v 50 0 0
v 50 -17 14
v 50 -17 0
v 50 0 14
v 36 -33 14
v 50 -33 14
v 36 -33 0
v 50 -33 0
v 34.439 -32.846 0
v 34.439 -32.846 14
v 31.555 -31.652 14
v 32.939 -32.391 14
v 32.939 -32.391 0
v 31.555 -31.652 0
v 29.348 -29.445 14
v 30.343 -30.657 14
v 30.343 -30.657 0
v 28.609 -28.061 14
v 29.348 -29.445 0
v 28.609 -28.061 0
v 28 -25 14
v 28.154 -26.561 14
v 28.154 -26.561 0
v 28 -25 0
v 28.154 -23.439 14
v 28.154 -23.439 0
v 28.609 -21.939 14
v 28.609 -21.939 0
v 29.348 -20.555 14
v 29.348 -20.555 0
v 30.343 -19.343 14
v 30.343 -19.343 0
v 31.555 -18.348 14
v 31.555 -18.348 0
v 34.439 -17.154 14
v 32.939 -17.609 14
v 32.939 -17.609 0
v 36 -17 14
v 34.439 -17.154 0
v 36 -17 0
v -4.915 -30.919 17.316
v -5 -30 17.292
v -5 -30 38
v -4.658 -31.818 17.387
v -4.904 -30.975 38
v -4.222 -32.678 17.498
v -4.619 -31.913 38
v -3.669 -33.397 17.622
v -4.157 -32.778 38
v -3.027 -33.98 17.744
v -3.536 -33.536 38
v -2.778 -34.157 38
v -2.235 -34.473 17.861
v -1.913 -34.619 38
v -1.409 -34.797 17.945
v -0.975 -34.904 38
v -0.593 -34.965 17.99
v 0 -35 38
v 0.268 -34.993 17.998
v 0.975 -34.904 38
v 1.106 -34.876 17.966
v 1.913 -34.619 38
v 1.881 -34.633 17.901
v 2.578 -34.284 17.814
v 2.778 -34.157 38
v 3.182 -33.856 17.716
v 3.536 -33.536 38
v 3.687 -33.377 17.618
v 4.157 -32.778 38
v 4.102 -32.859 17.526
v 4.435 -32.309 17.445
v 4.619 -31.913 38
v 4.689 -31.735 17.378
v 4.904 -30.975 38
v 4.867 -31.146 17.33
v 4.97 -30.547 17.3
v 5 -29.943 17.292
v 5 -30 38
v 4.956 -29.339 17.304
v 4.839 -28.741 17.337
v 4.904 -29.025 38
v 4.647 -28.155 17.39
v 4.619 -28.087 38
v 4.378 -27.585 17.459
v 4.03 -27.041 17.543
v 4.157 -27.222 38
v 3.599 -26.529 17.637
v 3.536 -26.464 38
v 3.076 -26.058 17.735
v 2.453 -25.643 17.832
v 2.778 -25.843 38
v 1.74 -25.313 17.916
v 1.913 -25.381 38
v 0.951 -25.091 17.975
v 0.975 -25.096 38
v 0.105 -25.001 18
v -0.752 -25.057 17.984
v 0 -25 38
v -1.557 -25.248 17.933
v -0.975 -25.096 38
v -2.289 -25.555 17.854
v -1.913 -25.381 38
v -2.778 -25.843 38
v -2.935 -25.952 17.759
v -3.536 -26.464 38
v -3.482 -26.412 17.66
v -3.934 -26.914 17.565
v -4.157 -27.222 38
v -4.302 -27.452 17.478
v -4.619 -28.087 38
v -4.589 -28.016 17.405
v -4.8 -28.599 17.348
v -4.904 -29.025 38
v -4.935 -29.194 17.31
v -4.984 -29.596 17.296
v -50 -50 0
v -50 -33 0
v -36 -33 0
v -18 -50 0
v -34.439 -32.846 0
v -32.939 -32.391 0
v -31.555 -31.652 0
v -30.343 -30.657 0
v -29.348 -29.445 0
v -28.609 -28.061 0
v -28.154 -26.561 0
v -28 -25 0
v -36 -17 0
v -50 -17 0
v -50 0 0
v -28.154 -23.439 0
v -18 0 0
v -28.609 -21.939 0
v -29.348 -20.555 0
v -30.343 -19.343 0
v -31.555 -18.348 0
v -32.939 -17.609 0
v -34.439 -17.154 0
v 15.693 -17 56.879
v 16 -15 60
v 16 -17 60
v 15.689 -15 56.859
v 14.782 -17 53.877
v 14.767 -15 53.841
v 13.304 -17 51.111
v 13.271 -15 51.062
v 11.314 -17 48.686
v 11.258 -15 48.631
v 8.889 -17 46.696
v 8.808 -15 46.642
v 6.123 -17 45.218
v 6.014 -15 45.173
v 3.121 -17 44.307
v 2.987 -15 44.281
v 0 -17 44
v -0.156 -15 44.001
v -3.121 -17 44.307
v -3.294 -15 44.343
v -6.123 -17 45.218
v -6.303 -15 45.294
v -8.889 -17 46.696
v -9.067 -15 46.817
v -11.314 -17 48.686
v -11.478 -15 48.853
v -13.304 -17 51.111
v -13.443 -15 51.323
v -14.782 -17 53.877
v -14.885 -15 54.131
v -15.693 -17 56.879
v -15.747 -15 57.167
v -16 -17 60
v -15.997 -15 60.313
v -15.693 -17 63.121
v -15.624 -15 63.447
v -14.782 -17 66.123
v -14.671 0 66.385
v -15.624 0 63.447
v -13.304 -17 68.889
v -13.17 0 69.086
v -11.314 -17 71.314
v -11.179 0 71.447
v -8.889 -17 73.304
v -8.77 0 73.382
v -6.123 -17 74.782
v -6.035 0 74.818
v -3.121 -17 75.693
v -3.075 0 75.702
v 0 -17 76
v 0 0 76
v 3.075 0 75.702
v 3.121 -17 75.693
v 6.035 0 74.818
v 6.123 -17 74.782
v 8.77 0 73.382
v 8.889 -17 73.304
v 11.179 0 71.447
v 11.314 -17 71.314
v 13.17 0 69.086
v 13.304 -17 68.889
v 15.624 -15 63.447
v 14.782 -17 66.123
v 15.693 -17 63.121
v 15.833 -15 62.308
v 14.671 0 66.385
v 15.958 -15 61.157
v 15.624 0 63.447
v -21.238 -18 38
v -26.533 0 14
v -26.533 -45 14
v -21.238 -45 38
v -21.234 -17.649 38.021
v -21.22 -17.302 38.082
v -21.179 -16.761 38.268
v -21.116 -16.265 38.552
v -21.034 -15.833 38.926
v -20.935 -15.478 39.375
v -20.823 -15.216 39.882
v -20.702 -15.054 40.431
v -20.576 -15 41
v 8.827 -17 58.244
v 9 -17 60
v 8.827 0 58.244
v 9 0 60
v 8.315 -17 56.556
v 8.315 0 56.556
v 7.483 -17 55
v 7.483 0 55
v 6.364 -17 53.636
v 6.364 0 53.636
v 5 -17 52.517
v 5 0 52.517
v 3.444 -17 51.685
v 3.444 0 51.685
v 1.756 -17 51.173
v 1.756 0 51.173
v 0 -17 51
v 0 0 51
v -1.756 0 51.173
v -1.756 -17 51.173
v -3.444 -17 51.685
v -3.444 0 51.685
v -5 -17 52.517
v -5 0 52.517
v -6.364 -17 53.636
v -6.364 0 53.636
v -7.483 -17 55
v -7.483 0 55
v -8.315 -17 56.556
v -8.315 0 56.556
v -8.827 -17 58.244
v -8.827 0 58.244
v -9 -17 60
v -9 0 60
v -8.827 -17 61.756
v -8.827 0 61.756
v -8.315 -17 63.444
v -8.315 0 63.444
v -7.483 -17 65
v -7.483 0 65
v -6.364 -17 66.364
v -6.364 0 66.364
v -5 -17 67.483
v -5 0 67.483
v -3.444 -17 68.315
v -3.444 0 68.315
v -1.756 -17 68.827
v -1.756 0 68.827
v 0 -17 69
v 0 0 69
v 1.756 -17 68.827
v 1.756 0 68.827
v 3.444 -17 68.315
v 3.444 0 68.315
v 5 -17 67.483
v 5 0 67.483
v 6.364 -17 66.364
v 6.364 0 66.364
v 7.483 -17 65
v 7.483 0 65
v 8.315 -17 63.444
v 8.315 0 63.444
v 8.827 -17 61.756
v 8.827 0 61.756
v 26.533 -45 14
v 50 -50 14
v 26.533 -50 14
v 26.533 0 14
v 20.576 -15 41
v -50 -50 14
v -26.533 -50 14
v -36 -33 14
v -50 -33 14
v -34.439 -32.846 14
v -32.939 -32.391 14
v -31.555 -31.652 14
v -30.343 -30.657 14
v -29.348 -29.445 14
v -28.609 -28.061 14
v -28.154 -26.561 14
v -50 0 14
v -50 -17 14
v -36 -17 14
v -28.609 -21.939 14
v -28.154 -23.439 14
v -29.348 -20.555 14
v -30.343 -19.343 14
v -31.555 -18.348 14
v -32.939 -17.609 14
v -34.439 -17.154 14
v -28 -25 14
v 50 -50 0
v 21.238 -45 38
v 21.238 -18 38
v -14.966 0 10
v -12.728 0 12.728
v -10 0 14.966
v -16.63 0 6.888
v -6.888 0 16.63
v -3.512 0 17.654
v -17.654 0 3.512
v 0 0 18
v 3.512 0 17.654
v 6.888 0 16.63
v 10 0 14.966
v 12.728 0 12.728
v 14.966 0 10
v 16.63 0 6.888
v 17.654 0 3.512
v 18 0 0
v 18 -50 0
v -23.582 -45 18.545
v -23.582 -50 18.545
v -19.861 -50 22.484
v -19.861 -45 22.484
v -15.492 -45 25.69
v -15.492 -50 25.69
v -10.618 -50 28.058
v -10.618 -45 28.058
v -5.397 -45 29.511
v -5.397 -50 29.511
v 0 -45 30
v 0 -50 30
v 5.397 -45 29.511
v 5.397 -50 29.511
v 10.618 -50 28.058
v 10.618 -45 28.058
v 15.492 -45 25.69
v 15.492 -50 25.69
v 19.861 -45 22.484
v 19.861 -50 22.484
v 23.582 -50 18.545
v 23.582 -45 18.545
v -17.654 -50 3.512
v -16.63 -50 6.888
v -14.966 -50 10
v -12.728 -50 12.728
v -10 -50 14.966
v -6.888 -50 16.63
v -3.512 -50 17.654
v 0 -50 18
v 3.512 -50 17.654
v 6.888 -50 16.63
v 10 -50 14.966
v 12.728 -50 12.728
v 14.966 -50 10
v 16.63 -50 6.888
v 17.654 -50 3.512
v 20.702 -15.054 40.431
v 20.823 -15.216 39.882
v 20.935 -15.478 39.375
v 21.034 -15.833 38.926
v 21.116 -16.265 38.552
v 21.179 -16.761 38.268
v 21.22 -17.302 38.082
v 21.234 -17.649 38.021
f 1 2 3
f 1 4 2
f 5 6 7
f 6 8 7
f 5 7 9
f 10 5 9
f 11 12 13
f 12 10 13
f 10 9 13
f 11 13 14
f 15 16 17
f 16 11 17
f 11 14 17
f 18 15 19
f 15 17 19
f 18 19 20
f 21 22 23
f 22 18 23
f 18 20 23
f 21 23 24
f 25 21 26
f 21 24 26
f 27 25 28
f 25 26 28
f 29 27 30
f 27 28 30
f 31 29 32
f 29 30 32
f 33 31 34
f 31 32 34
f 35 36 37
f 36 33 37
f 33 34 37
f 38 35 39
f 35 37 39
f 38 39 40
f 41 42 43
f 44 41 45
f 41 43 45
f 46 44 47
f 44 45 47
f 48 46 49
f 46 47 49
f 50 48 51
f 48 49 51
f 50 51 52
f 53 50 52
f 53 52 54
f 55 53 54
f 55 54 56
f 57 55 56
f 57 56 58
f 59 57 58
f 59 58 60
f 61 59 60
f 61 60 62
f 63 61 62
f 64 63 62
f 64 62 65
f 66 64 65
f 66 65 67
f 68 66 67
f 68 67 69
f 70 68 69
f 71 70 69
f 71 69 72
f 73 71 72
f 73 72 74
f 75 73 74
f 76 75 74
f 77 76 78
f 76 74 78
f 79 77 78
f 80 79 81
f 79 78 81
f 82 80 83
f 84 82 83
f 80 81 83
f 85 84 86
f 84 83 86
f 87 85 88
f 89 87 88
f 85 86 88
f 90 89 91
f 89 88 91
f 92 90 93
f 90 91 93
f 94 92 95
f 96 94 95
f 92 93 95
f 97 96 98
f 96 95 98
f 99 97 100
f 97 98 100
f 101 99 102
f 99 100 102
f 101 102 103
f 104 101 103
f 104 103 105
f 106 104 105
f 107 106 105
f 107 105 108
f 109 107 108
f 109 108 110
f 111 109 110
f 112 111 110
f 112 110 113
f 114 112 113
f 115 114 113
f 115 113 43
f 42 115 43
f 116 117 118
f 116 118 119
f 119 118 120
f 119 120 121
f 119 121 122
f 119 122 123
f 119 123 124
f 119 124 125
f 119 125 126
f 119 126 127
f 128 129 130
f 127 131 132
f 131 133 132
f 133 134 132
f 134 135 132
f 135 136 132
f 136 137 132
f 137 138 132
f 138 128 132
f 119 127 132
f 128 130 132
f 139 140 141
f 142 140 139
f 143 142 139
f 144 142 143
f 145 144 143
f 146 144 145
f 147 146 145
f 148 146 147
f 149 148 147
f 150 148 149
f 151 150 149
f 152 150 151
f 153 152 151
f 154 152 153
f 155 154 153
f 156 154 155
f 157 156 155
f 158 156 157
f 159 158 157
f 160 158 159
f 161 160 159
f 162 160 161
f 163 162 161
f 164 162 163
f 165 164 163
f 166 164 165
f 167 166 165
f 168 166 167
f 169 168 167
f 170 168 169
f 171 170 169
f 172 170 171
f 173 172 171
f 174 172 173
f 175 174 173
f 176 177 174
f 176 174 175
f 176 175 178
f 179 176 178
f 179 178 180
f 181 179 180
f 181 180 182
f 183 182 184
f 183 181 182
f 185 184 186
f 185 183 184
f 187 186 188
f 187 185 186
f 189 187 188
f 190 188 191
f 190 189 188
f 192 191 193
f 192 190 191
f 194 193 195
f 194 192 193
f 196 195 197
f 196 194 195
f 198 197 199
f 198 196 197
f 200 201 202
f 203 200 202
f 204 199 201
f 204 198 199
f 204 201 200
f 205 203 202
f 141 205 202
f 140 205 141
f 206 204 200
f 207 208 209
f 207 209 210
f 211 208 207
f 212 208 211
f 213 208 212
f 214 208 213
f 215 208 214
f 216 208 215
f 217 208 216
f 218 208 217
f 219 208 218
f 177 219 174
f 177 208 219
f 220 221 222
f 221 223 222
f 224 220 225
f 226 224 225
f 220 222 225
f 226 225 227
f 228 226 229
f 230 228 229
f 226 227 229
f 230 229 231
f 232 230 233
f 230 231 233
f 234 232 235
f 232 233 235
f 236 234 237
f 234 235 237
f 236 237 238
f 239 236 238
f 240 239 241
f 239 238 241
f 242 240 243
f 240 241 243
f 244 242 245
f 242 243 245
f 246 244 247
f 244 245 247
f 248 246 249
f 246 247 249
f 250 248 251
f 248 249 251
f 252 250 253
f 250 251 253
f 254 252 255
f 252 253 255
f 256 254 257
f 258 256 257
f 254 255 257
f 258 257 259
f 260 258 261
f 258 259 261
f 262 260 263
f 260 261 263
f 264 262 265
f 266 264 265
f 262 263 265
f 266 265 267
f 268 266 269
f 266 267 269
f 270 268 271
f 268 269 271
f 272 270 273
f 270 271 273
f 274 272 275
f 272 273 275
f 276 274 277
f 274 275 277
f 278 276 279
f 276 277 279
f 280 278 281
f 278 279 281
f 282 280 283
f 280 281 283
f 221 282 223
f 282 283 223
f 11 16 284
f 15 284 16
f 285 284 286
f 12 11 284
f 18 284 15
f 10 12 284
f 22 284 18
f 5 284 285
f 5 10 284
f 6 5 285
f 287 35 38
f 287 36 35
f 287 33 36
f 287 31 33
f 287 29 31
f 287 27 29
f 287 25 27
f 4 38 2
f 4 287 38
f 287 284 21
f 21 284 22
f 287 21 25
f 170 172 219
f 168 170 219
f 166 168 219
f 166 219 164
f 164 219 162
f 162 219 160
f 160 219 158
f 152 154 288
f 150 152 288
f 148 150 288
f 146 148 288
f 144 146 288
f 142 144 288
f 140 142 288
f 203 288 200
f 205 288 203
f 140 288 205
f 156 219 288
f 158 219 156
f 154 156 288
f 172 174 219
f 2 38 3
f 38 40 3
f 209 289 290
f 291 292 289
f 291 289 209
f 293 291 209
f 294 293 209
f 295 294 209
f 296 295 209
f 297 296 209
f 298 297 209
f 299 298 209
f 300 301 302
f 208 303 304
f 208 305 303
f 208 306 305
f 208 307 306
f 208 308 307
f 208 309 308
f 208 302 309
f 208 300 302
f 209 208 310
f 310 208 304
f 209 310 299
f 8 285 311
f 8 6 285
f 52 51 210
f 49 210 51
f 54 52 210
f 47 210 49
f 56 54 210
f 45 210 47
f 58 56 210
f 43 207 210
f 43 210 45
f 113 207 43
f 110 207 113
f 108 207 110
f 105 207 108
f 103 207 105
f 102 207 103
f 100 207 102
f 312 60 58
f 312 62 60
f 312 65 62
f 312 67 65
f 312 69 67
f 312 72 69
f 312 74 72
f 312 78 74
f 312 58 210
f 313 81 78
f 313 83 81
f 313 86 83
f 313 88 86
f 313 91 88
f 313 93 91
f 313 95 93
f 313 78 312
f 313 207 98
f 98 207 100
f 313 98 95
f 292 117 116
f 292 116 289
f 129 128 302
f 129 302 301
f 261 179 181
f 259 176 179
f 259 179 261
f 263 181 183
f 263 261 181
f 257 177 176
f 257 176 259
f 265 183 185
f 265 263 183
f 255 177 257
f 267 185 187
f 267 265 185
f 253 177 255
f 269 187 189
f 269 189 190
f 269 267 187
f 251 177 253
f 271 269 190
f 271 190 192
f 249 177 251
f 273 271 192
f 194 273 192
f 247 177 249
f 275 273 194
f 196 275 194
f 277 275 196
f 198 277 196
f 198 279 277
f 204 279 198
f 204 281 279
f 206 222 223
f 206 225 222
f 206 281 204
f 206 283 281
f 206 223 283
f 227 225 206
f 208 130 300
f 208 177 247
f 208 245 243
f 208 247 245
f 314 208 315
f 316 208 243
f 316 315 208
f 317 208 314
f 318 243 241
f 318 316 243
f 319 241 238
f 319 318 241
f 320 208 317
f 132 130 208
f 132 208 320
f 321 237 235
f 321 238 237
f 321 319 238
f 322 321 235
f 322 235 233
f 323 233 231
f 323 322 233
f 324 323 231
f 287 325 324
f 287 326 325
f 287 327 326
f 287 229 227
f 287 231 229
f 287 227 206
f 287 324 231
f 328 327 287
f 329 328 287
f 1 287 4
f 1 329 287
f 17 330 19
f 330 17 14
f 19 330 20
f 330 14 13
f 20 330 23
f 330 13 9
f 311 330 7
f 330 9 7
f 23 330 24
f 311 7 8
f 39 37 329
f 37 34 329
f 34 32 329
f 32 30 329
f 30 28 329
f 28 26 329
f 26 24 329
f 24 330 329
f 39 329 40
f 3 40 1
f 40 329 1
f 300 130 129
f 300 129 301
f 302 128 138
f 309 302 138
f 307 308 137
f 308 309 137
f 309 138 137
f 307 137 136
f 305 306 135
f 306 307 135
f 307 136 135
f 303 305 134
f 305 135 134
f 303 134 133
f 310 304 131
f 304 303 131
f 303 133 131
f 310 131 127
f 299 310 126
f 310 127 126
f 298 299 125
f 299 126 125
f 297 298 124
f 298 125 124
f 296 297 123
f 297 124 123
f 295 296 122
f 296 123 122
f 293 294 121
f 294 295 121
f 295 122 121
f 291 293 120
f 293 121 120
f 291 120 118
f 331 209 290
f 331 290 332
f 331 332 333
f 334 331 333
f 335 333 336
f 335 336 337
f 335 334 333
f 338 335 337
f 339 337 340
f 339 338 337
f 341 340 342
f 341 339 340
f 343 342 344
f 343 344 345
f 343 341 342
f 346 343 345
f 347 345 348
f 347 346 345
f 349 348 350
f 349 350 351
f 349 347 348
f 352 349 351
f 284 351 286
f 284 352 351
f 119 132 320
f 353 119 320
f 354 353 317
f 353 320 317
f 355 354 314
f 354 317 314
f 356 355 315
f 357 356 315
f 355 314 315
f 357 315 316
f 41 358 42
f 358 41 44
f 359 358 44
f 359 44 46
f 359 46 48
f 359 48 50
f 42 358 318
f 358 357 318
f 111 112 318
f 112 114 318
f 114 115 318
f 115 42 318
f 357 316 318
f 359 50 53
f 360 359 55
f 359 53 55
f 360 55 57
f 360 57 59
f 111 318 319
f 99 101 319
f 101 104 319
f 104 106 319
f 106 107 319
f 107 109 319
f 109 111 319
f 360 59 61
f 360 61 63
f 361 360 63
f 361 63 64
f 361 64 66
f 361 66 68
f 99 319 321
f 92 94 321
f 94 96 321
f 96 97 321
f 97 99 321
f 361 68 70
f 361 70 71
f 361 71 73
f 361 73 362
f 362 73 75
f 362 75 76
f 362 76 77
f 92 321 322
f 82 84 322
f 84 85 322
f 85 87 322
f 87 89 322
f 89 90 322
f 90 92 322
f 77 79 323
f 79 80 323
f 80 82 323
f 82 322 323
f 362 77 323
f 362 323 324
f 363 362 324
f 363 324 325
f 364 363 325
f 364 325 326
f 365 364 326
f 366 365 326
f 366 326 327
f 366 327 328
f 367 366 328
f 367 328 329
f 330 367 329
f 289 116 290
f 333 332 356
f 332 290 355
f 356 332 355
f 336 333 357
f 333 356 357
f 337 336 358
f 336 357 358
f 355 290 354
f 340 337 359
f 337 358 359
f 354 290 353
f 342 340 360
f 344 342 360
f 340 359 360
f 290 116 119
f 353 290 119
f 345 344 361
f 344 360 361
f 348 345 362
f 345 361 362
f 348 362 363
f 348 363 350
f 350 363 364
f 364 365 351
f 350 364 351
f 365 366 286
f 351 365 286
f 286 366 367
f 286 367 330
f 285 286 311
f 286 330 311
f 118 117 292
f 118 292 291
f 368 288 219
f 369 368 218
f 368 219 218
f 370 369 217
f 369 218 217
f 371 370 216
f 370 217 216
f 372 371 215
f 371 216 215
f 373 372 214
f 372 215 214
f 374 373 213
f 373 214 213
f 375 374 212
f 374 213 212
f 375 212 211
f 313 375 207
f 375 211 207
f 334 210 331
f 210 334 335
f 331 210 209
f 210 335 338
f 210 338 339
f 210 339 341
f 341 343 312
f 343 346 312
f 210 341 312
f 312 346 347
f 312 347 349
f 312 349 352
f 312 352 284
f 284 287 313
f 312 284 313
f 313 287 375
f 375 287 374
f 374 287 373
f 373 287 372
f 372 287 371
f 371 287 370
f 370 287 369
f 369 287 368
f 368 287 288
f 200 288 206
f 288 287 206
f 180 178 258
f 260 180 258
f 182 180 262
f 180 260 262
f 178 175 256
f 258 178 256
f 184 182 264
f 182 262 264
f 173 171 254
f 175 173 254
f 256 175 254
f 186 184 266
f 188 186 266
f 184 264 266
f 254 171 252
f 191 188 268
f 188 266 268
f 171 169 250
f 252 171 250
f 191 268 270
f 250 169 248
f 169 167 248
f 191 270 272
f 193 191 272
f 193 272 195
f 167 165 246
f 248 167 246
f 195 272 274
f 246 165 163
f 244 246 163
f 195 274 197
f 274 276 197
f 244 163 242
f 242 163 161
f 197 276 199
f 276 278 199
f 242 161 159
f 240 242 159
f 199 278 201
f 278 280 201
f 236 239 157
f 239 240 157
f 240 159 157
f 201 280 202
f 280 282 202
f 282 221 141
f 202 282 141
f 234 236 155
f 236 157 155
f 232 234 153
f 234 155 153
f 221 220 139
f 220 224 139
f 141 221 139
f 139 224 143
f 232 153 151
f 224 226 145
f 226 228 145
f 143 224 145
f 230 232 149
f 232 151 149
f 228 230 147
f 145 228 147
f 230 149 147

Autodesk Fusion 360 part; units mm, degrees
sketch "草图1" plane through (0, 0, 0) normal (0, 1, 0) x (1, 0, 0)
  line L0 (-100, 0) -> (100, 0) construction
  line L1 (-50, 0) -> (-50, -14)
  line L2 (-50, -14) -> (-26.533, -14)
  arc A0 (-26.533, -14) -> (26.533, -14) centre (0, 0) ccw
  line L3 (26.533, -14) -> (50, -14)
  line L4 (50, -14) -> (50, 0)
  line L5 (18, 0) -> (50, 0)
  line L6 (-50, 0) -> (-18, 0)
  line L7 (0, -85) -> (0, 30) construction
  arc A1 (-18, 0) -> (18, 0) centre (0, 0) ccw
  circle A2 centre (0, -60) radius 16
  circle A3 centre (0, -60) radius 9
  line L8 (-26.533, -14) -> (-15.6243, -63.4469)
  line L9 (26.533, -14) -> (15.6243, -63.4469)
  line L10 (-21.2383, -38) -> (21.2383, -38)
  dimension "d1" = 14
  dimension "d2" = 14
  dimension "d3" = 100
  dimension "d5" = 30
  dimension "d6" = 18
  dimension "d7" = 32
  dimension "d8" = 18
  dimension "d9" = 60
  dimension "d10" = 38
extrude "拉伸1" add sketch "草图1" against normal blind 50 contours L1 L2 A0 L3 L4 L5 L6 A1 makes body 1
extrude "拉伸2" add sketch "草图1" against normal blind 45 contours A0 L8 L9 L10 bodies 1
extrude "拉伸3" add sketch "草图1" against normal blind 15 contours A2 L8 L9 L10 bodies 1
extrude "拉伸4" add sketch "草图1" against normal blind 17 contours A2 bodies 1
sketch "草图2" plane through (0, 0, 0) normal (1, 0, 0) x (0, 1, 0)
  line L0 (-15, 63.4469) -> (-15, 41)
  line L1 (-18, 38) -> (-45, 38)
  arc A0 (-18, 38) -> (-15, 41) centre (-18, 41) ccw
  line L2 (-15, 63.4469) -> (-15, 38)
  line L3 (-15, 38) -> (-45, 38)
  point P0 (-15, 63.4469)
  point P1 (-45, 38)
  point P2 (-15, 38)
  dimension "d19" = 3
extrude "拉伸5" add sketch "草图2" along normal mid plane 54 separate body makes body 2
extrude "拉伸6" cut sketch "草图1" against normal blind 75 contours A2 L8 L9 L10 keep common part bodies 2
combine "合并1" operation add target body 1 tool bodies 2
sketch "草图3" plane through (0, 0, 0) normal (0, 0, 1) x (1, 0, 0)
  line L0 (-50, -17) -> (-50, -33)
  line L1 (-50, -33) -> (-36, -33)
  arc A0 (-36, -33) -> (-36, -17) centre (-36, -25) ccw
  line L2 (-36, -17) -> (-50, -17)
  line L3 (0, 15) -> (0, -36) construction
  line L4 (36, -17) -> (50, -17)
  line L5 (50, -17) -> (50, -33)
  line L6 (50, -33) -> (36, -33)
  arc A1 (36, -17) -> (36, -33) centre (36, -25) ccw
  dimension "d24" = 50
  dimension "d25" = 36
  dimension "d26" = 16
  dimension "d27" = 25
extrude "拉伸7" cut sketch "草图3" along normal blind 14 bodies 1
sketch "草图4" plane through (0, 0, 38) normal (0, 0, 1) x (-1, 0, 0)
  line L0 (-21.2383, 18) -> (21.2383, 18)
  line L1 (21.2383, 18) -> (21.2383, 45)
  line L2 (21.2383, 45) -> (-21.2383, 45)
  line L3 (-21.2383, 45) -> (-21.2383, 18)
  circle A0 centre (0, 30) radius 5
  line L4 (0, 45) -> (0, 18) construction
  dimension "d30" = 15
  dimension "d31" = 10
extrude "拉伸8" cut sketch "草图4" against normal blind 57 contours A0 bodies 1
equation "d10 = 60 mm - 22 mm"
